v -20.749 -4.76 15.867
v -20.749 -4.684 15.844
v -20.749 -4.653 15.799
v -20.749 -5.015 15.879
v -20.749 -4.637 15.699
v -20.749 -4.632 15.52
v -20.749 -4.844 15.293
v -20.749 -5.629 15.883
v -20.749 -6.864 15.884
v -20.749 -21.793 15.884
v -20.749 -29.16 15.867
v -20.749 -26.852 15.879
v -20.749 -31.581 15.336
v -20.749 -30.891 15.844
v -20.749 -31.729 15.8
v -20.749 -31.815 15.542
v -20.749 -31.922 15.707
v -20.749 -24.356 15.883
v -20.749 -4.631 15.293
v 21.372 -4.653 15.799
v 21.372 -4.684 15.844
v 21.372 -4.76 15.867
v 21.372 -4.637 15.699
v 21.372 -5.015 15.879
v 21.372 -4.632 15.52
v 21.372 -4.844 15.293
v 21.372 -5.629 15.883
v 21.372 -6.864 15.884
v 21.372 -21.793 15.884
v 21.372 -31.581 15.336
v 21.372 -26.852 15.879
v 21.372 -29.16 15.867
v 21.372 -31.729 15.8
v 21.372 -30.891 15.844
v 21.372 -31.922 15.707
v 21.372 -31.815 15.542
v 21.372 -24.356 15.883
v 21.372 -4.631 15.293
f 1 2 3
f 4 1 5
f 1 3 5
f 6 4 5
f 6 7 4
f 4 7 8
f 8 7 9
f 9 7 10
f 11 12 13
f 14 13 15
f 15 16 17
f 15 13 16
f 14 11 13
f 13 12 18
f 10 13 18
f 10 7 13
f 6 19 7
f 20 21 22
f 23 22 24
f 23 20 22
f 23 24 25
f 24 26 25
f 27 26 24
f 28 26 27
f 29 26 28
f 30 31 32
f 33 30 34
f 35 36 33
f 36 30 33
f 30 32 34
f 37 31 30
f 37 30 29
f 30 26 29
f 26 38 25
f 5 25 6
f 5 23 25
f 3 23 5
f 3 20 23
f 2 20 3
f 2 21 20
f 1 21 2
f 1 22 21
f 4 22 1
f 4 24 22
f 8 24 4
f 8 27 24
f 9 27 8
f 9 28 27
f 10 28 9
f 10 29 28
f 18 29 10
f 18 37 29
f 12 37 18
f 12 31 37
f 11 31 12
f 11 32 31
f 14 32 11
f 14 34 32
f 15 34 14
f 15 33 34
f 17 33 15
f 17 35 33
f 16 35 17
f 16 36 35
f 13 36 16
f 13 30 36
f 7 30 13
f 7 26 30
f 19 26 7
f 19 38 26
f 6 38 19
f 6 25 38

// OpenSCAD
// sb_harp_wood_inside
// SOUNDBOX inner lining piece "harp_wood_inside".
// Reverse-engineered from analysis JSON (model world units, NOT mm).
//
// Construction choice: FLAT PLATE (linear_extrude of a constant outline).
//   OBB dims = [42.12, 27.29, 0.646].  One OBB dim (0.646, along principal
//   axis e0) is ~42x/~66x smaller than the other two => thin flat plate.
//   The 7 cross-sections sliced along the long axis (e1) are essentially
//   identical (same outline within sub-0.1 unit jitter) => CONSTANT profile,
//   so a single outline swept along e1 reproduces the shape exactly.
//
// The 7 cross-sections are sliced along the SWEEP axis = e0 (= world X,
// section world_pos.x runs -20.75 .. +21.37 while y,z stay fixed).
// Each section outline is given in the (e1, e2) plane:
//   outline 1st coord = e1 (the 27.29-wide outline coordinate, ~world Y),
//   outline 2nd coord = e2 (the 0.646 thin/thickness coordinate, ~world Z).
//
// Local frame used to build geometry (per SHARED CONTRACT
// world = centroid + u*e1 + v*e2 + w*e0):
//   local x = u = e1 (outline width coordinate)
//   local y = v = e2 (outline thin/thickness coordinate)
//   local z = w = e0 (sweep axis)
// Placed back to world coords with multmatrix whose columns are
//   [ e1 | e2 | e0 | centroid ].

module sb_harp_wood_inside() {
    // --- principal axes from JSON (e0=thin, e1=long sweep, e2=width) ---
    e0 = [ 0.999999999999999, 4.080533203209976e-08, -5.195677116993409e-09 ];
    e1 = [ -4.079117591697188e-08, 0.9999963656460189, 0.0026960516967458603 ];
    e2 = [ 5.305671518725019e-09, -0.002696051696745555, 0.99999636564602 ];
    centroid = [ 0.31174035168980263, -18.940998050994775, 15.742848081661917 ];

    // --- key dimensions (model units) ---
    sweep_min = -21.06039328592594;   // obb_min along e0 (sweep axis)
    sweep_max =  21.06042008382528;   // obb_max along e0 (sweep axis)
    sweep_len = sweep_max - sweep_min; // ~42.12 long axis

    // Cross-section outline in (e1, e2) plane (first coord -> local x = e1
    // = width ~27.29; second coord -> local y = e2 = thickness ~0.646).
    // Taken from the mid-section (s ~= 0); all sections match to ~0.1 units.
    outline = [
        [ -12.98081096319675,   -0.0012004146546172184 ],
        [ -12.874776522523836,  -0.16576777850281812   ],
        [ -12.641078374338878,  -0.3725658134383558    ],
        [  14.095366556414852,  -0.4882501226337789    ],
        [  14.30897821146989,   -0.48882601782636426   ],
        [  14.308761640427582,  -0.26176333704600196   ],
        [  14.303445951094751,  -0.08202747384794523   ],
        [  14.287969748227038,   0.017577257752377187  ],
        [  14.257419992889528,   0.06228029785476115   ],
        [  14.18123671256184,    0.08592041681057808   ],
        [  13.926107364267846,   0.09864081380347323   ],
        [  13.31236823452081,    0.10473104760524393   ],
        [  12.077700923804764,   0.10869112129297366   ],
        [  11.926059988181972,   0.10910092342014076   ],
        [   4.950142847152765,   0.12790843002158353   ],
        [   2.356783781076516,   0.1349002872010575    ],
        [  -0.26820909907201795, 0.14197740760655003   ],
        [  -2.8519094283243756,  0.14894226890156992   ],
        [  -5.4142015490897055,  0.1552180776580507    ],
        [  -7.910553767061631,   0.1575137950631383    ],
        [ -10.219125788309363,   0.15170624829559382   ],
        [ -11.950139712218796,   0.1329374904585362    ],
        [ -12.78788193291687,    0.09148236649036412   ],
    ];

    multmatrix([
        [ e1[0], e2[0], e0[0], centroid[0] ],
        [ e1[1], e2[1], e0[1], centroid[1] ],
        [ e1[2], e2[2], e0[2], centroid[2] ],
        [ 0,     0,     0,     1           ],
    ])
    // extrude the (e1,e2) outline along local z (= e0 sweep axis)
    translate([0, 0, sweep_min])
        linear_extrude(height = sweep_len)
            polygon(points = outline);
}

sb_harp_wood_inside();
